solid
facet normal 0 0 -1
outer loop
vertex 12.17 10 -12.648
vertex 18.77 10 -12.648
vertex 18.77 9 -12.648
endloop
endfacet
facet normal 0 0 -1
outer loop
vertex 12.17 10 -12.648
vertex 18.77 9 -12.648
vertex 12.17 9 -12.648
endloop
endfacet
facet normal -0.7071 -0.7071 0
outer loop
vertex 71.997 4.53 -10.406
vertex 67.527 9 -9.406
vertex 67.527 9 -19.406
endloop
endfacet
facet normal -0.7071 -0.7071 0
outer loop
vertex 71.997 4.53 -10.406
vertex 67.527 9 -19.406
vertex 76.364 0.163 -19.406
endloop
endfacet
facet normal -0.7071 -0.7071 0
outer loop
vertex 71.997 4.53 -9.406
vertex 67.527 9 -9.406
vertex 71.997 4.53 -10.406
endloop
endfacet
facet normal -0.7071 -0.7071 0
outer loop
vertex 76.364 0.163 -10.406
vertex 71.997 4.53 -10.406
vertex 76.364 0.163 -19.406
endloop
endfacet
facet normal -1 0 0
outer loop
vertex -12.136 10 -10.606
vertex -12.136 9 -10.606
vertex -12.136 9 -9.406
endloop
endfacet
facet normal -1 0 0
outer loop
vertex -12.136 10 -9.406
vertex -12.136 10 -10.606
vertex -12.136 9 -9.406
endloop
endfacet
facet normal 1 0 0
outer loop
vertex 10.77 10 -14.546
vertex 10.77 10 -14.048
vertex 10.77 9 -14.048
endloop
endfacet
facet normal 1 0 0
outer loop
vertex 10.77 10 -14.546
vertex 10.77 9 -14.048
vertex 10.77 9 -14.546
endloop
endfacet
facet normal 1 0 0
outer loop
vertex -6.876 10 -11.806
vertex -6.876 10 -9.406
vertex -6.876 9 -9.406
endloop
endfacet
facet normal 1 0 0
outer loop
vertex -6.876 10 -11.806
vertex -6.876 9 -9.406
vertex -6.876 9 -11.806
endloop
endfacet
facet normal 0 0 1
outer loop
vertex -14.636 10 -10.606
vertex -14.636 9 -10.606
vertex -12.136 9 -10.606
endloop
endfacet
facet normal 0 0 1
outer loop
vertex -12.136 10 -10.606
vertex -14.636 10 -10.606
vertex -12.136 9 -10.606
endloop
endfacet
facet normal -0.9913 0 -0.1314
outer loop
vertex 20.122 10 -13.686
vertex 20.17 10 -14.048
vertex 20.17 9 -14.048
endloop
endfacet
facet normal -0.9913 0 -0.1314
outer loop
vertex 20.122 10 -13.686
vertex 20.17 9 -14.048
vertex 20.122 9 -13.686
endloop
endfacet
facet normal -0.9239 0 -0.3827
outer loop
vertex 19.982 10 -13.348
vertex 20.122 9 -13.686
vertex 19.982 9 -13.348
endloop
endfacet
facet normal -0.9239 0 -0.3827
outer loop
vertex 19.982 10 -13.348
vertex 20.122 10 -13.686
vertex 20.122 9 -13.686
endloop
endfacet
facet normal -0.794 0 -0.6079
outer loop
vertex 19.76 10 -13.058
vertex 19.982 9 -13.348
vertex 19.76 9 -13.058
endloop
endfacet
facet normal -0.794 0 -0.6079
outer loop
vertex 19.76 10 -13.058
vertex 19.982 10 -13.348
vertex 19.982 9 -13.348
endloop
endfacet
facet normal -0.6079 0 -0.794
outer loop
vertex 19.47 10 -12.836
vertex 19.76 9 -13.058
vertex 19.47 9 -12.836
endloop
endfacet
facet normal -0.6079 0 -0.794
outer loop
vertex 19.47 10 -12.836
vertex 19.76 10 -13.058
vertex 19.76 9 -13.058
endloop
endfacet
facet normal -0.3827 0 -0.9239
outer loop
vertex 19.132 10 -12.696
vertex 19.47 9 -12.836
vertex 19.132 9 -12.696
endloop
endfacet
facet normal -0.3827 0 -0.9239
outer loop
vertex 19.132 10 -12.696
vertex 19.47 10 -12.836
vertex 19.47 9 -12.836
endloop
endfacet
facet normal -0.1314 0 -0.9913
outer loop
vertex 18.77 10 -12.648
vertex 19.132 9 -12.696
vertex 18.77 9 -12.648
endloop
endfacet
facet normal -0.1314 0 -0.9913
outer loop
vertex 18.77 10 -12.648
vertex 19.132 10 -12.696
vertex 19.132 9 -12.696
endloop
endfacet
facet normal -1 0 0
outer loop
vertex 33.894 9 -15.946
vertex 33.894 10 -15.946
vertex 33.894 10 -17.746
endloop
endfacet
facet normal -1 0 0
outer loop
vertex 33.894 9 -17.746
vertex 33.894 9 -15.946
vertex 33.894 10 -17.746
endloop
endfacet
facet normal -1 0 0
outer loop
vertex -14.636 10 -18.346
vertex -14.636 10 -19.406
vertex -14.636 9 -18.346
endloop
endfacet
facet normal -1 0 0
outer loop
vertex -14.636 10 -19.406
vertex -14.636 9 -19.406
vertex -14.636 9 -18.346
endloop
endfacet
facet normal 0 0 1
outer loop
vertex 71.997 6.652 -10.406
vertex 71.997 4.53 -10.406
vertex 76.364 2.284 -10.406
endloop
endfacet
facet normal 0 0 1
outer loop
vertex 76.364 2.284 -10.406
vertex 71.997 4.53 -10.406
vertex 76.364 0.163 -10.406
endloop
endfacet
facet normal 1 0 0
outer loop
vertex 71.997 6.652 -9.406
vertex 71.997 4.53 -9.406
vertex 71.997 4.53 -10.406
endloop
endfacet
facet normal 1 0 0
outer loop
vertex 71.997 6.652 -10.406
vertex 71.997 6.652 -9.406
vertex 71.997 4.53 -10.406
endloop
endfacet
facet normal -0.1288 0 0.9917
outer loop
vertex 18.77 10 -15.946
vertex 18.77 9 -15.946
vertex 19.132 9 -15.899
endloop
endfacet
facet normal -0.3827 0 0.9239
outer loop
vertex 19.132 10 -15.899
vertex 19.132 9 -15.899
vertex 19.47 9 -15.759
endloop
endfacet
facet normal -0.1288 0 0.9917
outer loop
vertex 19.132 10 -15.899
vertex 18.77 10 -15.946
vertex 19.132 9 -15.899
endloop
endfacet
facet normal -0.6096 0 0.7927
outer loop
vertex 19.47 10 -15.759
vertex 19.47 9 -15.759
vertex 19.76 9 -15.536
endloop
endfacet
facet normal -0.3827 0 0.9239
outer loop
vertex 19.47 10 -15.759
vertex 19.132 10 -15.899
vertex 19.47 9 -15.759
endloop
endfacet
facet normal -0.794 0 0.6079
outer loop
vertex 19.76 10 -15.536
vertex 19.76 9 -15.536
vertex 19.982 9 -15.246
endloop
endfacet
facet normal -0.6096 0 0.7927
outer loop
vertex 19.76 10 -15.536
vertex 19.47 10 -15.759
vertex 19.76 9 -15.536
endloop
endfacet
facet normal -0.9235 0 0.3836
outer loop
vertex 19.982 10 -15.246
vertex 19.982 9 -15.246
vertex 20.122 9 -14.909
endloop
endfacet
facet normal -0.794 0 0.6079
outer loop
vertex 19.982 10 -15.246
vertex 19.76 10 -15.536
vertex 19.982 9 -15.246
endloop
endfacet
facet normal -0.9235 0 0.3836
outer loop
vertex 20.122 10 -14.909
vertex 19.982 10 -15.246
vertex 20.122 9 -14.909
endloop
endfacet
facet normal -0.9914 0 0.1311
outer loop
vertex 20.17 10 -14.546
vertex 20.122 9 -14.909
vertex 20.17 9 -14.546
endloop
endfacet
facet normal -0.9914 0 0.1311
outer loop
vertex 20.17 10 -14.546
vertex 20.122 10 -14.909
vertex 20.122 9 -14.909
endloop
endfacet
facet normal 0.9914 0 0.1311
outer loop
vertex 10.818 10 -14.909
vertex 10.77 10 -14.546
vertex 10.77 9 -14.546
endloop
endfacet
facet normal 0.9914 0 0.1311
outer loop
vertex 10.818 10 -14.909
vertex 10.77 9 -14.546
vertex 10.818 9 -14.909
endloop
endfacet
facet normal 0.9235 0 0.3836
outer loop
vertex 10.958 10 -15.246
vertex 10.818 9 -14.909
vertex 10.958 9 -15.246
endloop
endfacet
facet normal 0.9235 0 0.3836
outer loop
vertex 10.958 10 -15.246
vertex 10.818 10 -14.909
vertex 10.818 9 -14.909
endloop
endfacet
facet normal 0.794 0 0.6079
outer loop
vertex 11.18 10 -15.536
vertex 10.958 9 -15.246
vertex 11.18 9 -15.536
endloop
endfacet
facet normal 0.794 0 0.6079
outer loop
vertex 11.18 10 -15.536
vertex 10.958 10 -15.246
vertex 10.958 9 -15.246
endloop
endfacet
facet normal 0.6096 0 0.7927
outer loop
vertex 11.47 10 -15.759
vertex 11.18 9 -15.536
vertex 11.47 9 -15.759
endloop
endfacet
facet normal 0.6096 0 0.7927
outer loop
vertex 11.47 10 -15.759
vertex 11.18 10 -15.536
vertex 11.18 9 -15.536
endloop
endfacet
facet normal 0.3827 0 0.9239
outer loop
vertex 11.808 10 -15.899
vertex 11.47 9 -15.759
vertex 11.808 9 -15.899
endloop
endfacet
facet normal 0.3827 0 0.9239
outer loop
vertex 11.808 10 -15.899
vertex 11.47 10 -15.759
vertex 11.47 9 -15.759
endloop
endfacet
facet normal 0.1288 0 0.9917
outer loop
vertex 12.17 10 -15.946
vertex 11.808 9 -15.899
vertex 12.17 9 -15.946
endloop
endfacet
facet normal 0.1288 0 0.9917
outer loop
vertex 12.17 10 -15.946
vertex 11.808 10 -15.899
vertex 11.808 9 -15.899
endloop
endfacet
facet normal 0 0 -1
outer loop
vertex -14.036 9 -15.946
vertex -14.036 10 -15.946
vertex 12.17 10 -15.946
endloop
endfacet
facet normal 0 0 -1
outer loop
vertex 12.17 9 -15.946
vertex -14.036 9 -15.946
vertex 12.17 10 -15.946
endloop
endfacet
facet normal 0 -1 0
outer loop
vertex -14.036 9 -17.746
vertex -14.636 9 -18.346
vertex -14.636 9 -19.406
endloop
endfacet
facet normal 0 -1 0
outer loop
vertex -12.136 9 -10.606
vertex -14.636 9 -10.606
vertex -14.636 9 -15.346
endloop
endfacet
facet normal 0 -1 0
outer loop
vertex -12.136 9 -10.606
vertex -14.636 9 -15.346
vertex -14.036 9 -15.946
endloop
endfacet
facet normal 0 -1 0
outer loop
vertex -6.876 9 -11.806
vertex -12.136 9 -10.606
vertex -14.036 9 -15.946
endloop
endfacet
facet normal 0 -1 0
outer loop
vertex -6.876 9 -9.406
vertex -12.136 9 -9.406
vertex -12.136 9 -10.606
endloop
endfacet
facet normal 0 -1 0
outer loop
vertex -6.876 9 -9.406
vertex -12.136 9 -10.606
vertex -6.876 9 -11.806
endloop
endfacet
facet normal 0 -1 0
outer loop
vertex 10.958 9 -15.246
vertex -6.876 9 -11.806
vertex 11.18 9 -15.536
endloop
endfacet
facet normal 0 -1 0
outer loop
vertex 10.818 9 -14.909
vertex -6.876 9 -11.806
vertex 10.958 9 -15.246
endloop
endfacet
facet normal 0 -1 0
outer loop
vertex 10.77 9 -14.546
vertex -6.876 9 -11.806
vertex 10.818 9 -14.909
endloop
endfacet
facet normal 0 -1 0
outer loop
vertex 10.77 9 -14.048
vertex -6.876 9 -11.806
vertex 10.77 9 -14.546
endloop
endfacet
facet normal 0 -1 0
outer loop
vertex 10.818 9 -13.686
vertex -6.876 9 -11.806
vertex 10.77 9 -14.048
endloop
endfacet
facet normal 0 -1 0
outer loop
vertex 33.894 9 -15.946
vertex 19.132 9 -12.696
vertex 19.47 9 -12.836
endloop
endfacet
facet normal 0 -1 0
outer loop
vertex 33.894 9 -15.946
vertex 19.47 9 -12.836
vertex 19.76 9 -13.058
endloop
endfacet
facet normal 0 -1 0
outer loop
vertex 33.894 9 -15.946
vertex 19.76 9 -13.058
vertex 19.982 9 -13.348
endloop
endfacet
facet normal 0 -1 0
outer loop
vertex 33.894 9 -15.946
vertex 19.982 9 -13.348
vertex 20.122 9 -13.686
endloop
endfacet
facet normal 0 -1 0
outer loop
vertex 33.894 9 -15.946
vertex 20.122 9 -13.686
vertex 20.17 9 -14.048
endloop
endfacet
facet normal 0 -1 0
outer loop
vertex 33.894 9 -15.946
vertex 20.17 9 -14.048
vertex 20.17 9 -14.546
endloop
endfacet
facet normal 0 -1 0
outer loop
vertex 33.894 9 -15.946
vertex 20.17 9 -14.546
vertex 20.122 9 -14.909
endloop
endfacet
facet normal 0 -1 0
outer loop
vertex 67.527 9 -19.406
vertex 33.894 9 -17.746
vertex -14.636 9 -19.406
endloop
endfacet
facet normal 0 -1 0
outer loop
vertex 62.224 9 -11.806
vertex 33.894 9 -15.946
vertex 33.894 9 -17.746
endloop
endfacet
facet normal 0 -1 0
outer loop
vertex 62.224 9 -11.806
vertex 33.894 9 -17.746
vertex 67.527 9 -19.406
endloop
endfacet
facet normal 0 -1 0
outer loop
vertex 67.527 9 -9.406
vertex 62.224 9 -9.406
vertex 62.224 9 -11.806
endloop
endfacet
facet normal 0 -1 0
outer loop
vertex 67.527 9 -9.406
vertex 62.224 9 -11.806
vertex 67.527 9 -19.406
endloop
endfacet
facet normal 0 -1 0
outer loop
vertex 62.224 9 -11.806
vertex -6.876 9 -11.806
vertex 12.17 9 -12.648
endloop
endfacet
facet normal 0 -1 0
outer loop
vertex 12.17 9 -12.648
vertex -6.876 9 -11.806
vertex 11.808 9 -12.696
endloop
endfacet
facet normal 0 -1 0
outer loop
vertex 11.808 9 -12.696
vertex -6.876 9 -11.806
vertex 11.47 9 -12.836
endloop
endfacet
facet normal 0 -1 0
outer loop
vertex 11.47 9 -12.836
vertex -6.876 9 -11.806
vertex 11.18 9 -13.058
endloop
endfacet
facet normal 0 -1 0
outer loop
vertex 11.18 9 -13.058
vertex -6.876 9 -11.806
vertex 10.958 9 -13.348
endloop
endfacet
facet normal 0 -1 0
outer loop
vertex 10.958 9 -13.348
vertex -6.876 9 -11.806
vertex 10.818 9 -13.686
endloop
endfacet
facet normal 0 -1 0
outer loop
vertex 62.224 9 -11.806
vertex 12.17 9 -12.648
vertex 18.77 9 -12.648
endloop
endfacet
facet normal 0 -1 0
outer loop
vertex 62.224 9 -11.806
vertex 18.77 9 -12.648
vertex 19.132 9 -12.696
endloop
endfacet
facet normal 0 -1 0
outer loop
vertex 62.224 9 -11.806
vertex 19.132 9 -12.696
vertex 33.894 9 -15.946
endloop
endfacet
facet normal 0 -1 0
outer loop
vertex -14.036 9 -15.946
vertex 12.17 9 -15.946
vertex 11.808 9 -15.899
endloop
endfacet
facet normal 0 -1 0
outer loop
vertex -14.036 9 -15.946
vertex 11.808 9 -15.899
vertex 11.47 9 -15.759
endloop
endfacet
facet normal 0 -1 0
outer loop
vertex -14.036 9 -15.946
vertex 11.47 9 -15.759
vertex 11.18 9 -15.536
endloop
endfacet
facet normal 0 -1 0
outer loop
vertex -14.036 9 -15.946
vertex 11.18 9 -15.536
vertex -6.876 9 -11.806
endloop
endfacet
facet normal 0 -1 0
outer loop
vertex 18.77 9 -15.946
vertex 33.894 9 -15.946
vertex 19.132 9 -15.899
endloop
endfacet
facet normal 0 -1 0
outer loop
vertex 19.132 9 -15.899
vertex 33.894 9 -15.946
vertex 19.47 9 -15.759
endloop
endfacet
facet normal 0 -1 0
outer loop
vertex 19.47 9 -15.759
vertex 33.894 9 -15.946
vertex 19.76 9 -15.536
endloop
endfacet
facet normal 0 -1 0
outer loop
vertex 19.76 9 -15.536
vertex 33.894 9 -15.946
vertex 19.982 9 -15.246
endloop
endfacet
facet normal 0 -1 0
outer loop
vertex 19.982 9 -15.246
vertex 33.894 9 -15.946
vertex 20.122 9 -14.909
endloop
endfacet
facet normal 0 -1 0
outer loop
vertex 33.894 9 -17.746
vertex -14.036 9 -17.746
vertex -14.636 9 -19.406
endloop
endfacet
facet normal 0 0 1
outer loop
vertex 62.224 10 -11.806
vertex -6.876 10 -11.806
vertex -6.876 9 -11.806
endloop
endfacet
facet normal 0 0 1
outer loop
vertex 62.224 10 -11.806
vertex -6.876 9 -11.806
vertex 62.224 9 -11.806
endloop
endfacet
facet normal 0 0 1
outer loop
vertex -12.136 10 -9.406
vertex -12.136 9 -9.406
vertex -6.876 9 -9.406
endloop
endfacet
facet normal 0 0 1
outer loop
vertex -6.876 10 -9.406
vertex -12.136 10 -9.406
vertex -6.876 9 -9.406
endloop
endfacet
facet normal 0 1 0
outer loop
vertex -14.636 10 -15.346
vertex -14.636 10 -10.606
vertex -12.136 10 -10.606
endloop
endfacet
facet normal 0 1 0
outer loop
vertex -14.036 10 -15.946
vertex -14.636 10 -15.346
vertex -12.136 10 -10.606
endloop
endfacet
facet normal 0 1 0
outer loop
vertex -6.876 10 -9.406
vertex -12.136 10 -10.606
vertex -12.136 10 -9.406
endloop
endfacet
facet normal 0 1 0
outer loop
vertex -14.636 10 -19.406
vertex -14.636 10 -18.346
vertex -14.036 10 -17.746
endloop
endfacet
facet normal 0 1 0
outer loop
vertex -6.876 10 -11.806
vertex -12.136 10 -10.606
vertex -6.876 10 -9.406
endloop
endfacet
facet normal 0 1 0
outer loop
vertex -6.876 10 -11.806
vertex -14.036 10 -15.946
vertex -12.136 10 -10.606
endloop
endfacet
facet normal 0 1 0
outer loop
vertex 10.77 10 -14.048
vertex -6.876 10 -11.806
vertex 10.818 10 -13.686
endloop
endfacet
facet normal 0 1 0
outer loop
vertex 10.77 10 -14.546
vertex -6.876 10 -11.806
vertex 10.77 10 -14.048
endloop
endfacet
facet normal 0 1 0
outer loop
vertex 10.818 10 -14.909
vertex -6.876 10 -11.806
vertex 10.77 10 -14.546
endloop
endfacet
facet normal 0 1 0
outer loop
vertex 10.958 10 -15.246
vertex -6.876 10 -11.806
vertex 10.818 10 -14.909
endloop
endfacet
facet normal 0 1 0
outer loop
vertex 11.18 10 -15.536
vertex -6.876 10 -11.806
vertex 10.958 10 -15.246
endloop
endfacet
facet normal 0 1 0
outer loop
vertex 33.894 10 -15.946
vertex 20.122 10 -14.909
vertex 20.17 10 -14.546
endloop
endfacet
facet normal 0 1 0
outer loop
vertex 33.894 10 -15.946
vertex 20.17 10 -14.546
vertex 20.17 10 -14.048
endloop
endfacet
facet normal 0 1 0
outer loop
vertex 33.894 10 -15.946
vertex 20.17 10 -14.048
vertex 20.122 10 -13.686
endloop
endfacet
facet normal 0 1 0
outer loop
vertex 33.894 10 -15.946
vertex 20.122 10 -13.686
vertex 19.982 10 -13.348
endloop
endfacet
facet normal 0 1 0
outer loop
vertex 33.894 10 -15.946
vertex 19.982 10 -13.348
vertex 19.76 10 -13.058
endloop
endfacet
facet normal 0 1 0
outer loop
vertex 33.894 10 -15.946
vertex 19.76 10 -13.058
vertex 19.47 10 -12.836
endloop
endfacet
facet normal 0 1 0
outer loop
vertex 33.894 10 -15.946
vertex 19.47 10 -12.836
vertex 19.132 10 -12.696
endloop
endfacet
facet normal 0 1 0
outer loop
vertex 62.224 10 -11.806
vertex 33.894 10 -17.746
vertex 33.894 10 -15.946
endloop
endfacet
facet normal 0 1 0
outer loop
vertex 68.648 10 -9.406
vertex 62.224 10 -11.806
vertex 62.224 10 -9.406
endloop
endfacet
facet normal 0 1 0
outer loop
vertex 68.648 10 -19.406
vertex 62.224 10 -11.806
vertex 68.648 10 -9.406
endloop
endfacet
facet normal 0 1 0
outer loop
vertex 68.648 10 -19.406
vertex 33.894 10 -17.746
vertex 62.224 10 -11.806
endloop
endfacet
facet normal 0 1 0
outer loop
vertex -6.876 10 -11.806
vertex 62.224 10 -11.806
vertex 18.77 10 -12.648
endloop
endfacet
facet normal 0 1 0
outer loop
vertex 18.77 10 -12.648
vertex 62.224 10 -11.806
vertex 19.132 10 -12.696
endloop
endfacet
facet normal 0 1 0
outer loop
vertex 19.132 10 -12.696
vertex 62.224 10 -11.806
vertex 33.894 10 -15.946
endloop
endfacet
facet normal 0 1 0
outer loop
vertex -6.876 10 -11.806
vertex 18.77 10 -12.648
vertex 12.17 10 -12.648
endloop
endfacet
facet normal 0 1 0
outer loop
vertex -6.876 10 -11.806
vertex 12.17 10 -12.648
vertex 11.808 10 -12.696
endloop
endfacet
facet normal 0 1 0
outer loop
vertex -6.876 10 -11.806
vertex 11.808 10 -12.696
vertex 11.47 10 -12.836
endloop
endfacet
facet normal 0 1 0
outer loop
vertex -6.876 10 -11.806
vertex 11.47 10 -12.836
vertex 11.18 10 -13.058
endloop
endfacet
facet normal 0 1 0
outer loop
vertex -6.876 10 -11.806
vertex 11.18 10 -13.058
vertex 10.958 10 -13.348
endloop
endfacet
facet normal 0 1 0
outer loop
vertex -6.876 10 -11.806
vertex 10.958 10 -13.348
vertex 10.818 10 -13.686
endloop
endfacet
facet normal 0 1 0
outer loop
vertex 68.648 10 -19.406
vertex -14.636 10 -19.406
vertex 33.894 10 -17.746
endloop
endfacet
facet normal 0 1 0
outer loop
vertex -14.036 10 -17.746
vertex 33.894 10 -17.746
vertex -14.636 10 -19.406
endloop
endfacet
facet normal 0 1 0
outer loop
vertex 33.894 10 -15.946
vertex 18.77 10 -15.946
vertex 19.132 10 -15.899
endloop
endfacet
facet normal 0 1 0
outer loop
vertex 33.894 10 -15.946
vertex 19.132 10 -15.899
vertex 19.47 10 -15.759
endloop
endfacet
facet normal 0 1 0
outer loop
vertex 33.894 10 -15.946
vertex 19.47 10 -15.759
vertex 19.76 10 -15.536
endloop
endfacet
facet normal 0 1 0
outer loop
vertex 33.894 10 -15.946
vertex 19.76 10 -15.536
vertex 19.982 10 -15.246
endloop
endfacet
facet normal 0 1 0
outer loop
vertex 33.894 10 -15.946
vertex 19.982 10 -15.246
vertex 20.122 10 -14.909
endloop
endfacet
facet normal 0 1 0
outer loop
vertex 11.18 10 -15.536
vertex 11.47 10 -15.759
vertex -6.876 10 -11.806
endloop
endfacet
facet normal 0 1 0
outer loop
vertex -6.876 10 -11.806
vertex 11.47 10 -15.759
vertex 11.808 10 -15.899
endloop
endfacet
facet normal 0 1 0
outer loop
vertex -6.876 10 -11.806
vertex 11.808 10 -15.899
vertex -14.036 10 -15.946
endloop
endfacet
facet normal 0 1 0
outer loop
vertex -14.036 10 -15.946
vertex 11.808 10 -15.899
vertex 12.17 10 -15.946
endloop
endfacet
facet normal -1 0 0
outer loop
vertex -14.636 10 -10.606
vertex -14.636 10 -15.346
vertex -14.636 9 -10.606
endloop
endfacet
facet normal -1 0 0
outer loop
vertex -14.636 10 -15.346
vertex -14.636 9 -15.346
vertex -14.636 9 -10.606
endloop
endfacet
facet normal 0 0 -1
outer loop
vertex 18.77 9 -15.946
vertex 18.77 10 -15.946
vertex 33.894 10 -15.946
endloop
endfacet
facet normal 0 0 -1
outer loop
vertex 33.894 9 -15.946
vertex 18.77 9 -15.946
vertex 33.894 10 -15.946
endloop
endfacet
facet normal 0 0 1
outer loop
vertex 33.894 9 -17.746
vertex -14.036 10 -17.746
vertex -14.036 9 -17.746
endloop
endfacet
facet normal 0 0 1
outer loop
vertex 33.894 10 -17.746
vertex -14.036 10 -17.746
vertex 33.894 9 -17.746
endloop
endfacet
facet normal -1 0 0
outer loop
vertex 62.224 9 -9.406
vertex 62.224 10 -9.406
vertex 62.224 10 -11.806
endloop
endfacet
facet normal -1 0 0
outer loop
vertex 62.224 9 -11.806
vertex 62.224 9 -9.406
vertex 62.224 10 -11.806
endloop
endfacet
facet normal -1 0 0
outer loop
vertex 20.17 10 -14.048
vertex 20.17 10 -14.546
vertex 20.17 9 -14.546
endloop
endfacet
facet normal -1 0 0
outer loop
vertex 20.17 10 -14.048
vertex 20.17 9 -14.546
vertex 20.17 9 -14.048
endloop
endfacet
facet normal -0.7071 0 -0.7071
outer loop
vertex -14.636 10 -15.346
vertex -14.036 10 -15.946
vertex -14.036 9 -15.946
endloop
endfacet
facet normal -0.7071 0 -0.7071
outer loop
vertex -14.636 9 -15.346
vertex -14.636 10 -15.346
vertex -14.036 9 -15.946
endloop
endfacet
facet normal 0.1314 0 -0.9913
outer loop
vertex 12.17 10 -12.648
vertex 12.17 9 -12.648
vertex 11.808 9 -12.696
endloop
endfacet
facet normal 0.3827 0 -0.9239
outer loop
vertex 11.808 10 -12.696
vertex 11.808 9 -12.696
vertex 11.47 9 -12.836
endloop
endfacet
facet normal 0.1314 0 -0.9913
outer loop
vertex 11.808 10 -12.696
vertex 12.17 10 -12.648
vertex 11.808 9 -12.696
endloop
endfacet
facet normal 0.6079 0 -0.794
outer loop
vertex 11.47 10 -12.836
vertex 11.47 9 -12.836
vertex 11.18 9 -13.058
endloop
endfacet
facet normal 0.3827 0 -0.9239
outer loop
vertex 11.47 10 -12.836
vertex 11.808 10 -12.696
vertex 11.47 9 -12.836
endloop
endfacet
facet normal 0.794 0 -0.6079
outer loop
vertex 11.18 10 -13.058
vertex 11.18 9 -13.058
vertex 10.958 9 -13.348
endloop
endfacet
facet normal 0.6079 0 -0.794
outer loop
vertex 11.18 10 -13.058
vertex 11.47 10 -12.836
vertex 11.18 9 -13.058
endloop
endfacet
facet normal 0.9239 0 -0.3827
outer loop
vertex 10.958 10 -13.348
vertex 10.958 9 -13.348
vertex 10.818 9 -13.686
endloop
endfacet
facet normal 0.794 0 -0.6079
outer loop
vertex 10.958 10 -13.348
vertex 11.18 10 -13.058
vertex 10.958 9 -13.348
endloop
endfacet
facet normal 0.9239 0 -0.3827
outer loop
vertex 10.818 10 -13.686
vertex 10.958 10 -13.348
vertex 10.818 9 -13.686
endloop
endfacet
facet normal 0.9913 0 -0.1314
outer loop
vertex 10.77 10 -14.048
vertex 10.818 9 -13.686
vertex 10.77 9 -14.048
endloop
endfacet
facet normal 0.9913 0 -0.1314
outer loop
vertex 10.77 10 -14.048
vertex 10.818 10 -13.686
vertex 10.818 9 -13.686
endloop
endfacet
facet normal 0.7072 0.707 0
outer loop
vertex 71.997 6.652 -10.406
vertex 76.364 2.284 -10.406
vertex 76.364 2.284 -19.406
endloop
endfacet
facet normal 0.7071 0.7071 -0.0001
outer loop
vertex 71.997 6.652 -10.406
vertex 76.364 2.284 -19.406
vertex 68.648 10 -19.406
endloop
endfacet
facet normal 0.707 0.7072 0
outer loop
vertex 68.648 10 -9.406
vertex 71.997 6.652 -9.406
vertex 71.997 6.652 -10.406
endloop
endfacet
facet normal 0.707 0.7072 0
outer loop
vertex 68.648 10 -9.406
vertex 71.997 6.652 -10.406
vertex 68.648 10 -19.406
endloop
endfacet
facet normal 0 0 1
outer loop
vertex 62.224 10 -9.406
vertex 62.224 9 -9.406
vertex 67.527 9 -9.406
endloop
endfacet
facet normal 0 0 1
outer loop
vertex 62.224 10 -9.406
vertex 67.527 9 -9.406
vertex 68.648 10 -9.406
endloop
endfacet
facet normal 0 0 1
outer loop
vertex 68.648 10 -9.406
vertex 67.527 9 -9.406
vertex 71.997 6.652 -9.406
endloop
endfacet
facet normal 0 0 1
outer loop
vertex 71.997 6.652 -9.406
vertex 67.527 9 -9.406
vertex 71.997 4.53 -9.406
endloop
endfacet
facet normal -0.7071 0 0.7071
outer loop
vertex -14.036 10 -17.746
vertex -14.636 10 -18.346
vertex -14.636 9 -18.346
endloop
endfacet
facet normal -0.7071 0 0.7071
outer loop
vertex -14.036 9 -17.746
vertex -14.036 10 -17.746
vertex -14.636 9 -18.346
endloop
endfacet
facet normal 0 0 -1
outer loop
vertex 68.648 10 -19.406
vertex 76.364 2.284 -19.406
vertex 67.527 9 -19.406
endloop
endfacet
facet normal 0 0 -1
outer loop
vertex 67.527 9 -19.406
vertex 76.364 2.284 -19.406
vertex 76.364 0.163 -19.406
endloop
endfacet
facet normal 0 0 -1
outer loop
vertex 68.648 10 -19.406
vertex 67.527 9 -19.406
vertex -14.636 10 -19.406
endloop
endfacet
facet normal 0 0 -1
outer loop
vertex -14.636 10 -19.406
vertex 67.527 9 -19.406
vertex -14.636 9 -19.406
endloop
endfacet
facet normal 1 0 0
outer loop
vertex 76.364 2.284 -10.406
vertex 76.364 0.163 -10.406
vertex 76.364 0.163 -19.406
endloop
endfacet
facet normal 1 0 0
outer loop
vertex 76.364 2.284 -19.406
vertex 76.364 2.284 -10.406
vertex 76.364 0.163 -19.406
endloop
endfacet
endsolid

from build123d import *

# Parameters (mm, degrees)
EXTRUDE_1_DEPTH     = 10
CUT_EXTRUDE_1_DEPTH = 78.662529175
SKETCH_3_W          = 48.53
SKETCH_3_H          = 1.8
SKETCH_3_W_2        = 69.1
SKETCH_3_H_2        = 2.4
CUT_EXTRUDE_2_DEPTH = 80.403046846
CUT_EXTRUDE_3_DEPTH = 80.403046846
CHAMFER_1_SIZE      = 0.6


with BuildPart() as part:
    # 草图1 → 凸台-拉伸1 (new body)
    with BuildSketch(Plane(origin=(0, 0, 0), x_dir=(1, 0, 0), z_dir=(0, 1, 0))):
        Polygon((-14.635948, 19.40625), (-14.635948, 10.60625), (-12.135948, 10.60625), (-12.135948, 9.40625), (71.996502, 9.40625), (71.996502, 10.40625), (76.364052, 10.40625), (76.364052, 19.40625), align=None)
    extrude(amount=EXTRUDE_1_DEPTH)

    # 草图2 → 切除-拉伸1 (cut, through all)
    with BuildSketch(Plane.XY.offset(-9.40625)):
        Polygon((-14.635948, 9), (67.526731656, 9), (76.526731656, 0), (-14.635948, 0), align=None)
        Polygon((78.332625034, 0.315426966), (67.430737892, 11.217314108), (78.393598105, 11.217314108), align=None)
    extrude(amount=-CUT_EXTRUDE_1_DEPTH, mode=Mode.SUBTRACT)

    # 草图3 → 切除-拉伸2 (cut, through all)
    with BuildSketch(Plane(origin=(0, 10, 0), x_dir=(1, 0, 0), z_dir=(0, 1, 0))):
        with Locations((9.629052, 16.84625)):
            Rectangle(SKETCH_3_W, SKETCH_3_H)
        with Locations((27.674052, 10.60625)):
            Rectangle(SKETCH_3_W_2, SKETCH_3_H_2)
    extrude(amount=-CUT_EXTRUDE_2_DEPTH, mode=Mode.SUBTRACT)

    # 草图4 → 切除-拉伸3 (cut, through all)
    with BuildSketch(Plane(origin=(0, 10, 0), x_dir=(1, 0, 0), z_dir=(0, 1, 0))):
        with BuildLine():
            Line((12.170037326, 15.94625), (18.770037326, 15.94625))
            ThreePointArc((18.770037326, 15.94625), (19.759986819, 15.536199494), (20.170037326, 14.54625))
            Line((20.170037326, 14.54625), (20.170037326, 14.048022825))
            ThreePointArc((20.170037326, 14.048022825), (19.759986819, 13.058073332), (18.770037326, 12.648022825))
            Line((18.770037326, 12.648022825), (12.170037326, 12.648022825))
            ThreePointArc((12.170037326, 12.648022825), (11.180087832, 13.058073332), (10.770037326, 14.048022825))
            Line((10.770037326, 14.048022825), (10.770037326, 14.54625))
            ThreePointArc((10.770037326, 14.54625), (11.180087832, 15.536199494), (12.170037326, 15.94625))
        make_face()
    extrude(amount=-CUT_EXTRUDE_3_DEPTH, mode=Mode.SUBTRACT)

    # 倒角1
    chamfer_1_edges = [part.edges().sort_by_distance(p)[0] for p in [
        (-14.635948, 9.5, -15.94625),
        (-14.635948, 9.5, -17.74625),
    ]]
    chamfer(chamfer_1_edges, length=CHAMFER_1_SIZE)


solid = part.part
